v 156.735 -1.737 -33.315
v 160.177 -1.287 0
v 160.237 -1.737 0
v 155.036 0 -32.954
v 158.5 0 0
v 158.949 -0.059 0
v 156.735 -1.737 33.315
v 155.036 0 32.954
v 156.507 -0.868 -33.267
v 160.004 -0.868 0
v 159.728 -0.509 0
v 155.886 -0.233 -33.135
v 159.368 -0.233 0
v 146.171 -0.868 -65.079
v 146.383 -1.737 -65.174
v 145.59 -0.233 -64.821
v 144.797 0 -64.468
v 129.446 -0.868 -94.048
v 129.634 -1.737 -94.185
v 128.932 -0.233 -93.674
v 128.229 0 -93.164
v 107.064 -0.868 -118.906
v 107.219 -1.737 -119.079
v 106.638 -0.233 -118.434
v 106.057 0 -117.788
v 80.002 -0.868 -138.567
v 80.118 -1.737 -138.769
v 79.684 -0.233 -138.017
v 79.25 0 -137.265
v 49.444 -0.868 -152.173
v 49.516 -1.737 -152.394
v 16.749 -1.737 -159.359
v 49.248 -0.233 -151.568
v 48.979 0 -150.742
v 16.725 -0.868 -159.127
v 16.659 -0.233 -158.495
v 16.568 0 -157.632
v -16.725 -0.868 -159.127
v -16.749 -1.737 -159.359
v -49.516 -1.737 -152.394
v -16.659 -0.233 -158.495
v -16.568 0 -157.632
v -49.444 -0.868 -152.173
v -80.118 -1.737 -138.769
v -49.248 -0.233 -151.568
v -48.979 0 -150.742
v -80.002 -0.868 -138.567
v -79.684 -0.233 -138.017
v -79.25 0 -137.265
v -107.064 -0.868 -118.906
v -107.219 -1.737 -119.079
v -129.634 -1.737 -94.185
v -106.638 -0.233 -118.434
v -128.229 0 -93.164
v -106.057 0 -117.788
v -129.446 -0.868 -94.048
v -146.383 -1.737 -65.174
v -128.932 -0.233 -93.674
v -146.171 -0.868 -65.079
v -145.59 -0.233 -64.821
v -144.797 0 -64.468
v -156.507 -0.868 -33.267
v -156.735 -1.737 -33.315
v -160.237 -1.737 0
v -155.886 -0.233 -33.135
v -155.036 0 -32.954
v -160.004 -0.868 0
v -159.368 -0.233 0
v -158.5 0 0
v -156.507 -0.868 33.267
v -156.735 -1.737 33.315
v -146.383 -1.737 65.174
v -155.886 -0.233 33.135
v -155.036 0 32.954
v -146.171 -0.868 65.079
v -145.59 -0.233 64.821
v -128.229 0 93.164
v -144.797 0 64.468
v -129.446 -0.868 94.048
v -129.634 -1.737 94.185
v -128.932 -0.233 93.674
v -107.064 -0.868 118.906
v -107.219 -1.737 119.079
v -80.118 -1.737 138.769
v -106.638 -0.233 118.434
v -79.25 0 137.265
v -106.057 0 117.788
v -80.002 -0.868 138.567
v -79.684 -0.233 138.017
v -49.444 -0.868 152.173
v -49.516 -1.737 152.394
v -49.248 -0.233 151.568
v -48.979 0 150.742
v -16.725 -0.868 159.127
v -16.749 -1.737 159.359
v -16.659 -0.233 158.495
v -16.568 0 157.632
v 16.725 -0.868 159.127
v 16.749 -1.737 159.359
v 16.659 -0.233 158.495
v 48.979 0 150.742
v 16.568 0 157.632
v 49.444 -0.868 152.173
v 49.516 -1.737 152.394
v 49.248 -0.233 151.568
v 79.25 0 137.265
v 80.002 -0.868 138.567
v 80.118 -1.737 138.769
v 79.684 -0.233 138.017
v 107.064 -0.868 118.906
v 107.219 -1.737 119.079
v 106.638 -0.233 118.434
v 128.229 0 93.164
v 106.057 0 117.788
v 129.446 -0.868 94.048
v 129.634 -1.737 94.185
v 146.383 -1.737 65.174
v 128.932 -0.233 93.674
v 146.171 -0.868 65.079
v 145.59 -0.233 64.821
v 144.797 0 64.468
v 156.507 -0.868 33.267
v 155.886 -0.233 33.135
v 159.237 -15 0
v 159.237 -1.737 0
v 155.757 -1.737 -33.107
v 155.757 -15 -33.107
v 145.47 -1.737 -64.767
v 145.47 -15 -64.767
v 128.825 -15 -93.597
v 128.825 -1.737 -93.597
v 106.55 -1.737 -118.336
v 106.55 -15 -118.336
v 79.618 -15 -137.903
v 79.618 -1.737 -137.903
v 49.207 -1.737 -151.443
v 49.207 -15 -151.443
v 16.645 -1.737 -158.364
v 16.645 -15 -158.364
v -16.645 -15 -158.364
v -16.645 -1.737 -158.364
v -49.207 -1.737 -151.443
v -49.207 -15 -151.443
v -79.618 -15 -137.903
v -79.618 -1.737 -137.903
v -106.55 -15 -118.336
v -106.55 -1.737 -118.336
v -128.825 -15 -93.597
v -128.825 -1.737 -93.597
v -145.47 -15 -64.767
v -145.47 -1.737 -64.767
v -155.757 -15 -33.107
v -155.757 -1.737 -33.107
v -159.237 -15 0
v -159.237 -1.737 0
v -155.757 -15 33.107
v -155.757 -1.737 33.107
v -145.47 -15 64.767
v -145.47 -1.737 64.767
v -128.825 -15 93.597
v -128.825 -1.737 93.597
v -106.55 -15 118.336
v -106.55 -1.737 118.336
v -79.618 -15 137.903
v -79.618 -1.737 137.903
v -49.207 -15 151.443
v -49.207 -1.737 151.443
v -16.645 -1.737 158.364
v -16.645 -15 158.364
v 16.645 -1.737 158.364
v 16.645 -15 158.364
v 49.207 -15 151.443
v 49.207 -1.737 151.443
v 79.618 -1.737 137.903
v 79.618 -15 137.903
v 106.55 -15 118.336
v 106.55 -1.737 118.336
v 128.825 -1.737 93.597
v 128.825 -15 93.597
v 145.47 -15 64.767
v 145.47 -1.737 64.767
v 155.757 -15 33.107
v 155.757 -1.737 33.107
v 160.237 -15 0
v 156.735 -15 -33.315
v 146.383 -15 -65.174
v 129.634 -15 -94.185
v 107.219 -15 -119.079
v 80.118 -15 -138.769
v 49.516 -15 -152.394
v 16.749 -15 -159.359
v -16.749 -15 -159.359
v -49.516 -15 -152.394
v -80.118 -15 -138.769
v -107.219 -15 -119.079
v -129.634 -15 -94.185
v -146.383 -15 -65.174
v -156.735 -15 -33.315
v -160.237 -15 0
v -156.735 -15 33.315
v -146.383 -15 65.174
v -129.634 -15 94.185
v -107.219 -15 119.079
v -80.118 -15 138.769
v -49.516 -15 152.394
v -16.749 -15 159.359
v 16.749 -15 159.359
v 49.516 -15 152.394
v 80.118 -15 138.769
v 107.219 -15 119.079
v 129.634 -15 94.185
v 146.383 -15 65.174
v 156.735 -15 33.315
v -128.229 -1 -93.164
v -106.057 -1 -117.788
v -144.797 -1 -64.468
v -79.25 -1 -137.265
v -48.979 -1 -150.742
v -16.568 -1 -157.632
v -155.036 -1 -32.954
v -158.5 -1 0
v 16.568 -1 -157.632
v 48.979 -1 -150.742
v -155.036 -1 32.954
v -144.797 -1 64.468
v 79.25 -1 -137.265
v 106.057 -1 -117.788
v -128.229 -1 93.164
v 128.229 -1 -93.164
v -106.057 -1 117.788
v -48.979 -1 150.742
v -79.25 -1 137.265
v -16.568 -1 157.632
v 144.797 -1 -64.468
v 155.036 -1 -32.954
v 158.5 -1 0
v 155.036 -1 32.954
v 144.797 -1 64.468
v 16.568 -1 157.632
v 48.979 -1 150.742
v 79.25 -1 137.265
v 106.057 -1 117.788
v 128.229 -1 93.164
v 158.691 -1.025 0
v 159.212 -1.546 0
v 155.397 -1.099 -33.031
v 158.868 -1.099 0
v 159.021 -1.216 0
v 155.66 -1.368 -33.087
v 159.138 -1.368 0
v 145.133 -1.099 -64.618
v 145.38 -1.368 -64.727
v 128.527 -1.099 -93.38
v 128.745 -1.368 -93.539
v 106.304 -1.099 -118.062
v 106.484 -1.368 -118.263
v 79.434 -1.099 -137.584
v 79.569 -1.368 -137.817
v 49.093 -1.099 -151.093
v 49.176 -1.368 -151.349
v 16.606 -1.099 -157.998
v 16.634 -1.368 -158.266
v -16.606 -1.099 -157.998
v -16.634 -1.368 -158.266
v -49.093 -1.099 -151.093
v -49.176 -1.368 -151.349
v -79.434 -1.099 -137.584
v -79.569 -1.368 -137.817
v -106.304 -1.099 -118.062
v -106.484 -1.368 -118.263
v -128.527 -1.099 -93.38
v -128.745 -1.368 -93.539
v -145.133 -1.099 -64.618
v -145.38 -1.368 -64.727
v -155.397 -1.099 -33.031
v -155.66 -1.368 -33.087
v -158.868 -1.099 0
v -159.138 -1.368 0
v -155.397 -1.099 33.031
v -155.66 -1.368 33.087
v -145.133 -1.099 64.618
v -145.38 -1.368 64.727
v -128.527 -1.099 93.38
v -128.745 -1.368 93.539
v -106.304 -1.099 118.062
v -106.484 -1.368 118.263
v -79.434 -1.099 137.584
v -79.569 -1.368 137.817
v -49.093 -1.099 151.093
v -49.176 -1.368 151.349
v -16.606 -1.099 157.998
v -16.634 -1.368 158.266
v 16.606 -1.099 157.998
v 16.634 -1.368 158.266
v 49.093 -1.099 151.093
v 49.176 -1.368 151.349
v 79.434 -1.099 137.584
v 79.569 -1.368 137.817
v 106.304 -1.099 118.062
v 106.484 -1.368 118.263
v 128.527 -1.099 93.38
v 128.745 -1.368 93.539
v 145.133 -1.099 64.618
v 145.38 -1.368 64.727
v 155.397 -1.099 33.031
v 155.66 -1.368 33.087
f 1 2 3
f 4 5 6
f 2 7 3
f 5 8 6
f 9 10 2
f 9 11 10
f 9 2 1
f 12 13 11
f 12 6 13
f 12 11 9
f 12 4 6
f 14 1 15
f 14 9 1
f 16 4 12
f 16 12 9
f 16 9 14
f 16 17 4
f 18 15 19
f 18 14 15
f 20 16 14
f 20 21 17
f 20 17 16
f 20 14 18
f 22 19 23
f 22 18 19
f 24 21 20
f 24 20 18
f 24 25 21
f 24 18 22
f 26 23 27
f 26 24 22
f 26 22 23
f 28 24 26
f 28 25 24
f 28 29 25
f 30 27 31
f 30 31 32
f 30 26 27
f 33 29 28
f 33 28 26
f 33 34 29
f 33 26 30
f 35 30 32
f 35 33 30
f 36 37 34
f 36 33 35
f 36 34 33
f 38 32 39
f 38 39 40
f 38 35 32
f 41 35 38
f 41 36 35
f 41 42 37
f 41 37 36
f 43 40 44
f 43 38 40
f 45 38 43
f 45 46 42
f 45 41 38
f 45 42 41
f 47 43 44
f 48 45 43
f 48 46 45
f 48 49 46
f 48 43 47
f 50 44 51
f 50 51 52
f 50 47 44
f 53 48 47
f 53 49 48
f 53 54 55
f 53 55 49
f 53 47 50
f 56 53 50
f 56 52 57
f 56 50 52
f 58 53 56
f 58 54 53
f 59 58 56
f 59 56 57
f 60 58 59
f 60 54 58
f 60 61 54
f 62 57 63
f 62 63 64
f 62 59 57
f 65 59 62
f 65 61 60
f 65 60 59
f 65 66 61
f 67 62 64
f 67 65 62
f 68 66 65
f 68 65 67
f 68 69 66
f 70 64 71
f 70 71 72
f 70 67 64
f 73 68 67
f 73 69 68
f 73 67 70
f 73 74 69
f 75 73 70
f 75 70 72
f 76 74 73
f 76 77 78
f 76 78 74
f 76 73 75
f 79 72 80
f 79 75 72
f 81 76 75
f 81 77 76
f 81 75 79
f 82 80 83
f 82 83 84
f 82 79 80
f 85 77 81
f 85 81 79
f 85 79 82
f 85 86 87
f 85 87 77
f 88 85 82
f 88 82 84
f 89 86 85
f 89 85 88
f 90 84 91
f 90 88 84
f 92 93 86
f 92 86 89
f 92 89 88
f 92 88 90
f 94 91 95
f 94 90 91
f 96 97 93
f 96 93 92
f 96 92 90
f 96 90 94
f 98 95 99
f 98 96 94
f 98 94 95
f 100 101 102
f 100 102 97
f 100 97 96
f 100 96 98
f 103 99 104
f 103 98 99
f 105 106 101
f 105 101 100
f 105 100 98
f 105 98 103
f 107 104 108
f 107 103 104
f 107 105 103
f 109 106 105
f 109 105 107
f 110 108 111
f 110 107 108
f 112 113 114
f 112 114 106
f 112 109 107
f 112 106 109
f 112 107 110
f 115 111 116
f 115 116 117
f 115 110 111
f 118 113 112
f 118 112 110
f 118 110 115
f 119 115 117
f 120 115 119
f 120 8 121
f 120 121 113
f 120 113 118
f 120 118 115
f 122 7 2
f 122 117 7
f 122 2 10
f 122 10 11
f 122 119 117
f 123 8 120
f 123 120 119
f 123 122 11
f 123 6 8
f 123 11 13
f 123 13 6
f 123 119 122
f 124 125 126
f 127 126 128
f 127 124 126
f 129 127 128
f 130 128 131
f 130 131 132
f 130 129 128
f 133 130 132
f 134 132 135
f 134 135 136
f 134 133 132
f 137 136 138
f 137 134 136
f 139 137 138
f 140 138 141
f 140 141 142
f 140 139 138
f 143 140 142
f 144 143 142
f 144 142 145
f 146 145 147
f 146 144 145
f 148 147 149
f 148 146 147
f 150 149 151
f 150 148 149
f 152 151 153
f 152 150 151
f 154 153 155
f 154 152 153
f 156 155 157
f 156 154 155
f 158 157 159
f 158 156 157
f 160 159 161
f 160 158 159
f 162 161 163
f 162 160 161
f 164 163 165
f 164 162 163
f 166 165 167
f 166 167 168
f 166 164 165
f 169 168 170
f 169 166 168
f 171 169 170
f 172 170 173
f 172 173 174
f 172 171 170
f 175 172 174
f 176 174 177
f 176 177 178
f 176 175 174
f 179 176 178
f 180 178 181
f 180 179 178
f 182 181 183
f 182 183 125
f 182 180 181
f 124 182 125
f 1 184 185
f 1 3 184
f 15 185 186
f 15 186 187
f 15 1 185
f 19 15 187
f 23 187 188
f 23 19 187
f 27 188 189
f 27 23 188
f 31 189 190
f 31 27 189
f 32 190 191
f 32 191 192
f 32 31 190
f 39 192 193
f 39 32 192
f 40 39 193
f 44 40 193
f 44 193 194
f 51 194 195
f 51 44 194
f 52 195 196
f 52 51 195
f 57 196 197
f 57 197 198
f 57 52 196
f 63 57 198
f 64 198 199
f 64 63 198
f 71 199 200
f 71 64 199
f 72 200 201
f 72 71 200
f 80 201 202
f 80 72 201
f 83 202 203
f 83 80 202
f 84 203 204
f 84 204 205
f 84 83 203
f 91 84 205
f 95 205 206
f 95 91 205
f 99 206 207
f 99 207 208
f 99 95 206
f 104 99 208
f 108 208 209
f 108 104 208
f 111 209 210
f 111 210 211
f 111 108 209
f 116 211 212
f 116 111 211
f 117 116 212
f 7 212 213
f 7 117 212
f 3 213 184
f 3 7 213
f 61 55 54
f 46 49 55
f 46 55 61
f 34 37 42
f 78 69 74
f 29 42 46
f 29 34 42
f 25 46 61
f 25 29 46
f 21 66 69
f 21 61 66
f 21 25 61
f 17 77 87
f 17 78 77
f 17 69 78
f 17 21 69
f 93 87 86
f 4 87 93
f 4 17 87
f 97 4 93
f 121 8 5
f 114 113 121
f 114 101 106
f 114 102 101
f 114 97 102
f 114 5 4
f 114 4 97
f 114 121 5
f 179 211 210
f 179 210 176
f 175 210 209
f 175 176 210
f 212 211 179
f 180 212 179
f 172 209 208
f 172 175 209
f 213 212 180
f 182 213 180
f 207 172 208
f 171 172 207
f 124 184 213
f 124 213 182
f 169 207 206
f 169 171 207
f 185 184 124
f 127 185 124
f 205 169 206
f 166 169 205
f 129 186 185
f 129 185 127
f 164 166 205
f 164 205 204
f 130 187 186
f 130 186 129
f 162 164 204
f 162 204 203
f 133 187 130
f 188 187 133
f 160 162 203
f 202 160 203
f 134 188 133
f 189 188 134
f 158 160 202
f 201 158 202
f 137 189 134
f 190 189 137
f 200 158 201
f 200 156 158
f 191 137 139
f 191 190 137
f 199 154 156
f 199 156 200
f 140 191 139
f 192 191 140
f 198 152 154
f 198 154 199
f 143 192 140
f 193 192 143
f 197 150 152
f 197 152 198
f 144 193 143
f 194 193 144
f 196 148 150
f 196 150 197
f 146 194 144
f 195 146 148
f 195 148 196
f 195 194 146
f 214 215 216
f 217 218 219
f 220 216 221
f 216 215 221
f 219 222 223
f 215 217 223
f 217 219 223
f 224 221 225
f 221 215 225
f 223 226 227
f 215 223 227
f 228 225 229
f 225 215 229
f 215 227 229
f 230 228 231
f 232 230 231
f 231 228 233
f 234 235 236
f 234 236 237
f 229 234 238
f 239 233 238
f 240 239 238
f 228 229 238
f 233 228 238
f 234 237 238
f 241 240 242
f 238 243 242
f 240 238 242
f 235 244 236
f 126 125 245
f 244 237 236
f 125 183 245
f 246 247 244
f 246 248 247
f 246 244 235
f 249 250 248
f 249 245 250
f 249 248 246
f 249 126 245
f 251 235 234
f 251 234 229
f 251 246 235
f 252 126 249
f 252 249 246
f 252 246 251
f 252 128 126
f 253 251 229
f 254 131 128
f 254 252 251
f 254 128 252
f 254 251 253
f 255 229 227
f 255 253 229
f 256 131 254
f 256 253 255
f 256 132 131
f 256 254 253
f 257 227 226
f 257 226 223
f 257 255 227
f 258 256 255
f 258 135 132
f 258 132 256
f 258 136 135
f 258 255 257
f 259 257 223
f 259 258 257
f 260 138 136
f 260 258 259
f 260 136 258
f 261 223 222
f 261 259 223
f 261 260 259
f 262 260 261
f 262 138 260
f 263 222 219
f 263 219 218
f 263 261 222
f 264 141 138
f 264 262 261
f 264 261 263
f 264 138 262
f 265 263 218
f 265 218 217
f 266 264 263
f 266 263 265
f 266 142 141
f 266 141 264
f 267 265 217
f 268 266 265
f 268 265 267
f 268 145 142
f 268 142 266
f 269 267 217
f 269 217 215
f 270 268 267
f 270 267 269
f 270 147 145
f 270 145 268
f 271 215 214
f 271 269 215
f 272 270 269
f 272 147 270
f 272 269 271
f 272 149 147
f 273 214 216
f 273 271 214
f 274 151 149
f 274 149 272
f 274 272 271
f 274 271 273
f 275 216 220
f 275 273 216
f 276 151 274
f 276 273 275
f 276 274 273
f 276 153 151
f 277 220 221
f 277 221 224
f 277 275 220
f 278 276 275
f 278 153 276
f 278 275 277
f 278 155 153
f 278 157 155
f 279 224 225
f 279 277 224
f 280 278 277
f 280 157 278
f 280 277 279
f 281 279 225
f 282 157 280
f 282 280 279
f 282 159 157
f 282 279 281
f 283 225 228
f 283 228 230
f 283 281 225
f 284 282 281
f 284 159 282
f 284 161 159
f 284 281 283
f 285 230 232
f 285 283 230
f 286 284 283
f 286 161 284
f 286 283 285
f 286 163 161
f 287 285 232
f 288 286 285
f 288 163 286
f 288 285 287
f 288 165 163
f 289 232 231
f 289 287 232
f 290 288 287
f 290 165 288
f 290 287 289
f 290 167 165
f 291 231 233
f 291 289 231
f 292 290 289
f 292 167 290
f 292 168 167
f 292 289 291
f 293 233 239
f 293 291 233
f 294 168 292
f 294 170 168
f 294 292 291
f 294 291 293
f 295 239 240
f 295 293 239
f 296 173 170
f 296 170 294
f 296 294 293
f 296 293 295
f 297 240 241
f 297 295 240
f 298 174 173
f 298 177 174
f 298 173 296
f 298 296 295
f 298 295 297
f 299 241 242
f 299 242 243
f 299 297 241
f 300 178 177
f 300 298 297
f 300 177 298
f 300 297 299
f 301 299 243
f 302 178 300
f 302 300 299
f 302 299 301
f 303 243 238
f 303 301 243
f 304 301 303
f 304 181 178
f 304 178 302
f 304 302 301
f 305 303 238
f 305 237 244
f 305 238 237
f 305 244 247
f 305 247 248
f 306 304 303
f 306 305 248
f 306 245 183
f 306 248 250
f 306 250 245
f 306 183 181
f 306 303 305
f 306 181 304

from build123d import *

# Parameters (mm, degrees)
SKETCH1_R          = 158.5
BASE_FLANGE1_DEPTH = 1


# Read off the part's stored shape, not the designer's step: Edge-Flange1
# Sheet-metal steps are written as plain solids
with BuildPart() as part:
    # Sketch1 → Base-Flange1 (new body)
    with BuildSketch(Plane(origin=(0, 0, 0), x_dir=(1, 0, 0), z_dir=(0, 1, 0))):
        with Locations(Location((0, 0, 0), (0, 0, 270))):
            Circle(SKETCH1_R)
    extrude(amount=-BASE_FLANGE1_DEPTH)

    # Edge-Flange1 outline → Edge-Flange1 (revolve)
    with BuildSketch(Plane.XY):
        with BuildLine():
            Line((159.2366, -1.7366), (159.2366, -15))
            Line((159.2366, -15), (160.2366, -15))
            Line((160.2366, -15), (160.2366, -1.7366))
            ThreePointArc((160.2366, -1.7366), (159.727961636, -0.508638364), (158.5, 0))
            Line((158.5, 0), (158.5, -1))
            ThreePointArc((158.5, -1), (159.020854855, -1.215745145), (159.2366, -1.7366))
        make_face()
    revolve(axis=Axis((0, 0, 0), (0, 1, 0)))


solid = part.part
